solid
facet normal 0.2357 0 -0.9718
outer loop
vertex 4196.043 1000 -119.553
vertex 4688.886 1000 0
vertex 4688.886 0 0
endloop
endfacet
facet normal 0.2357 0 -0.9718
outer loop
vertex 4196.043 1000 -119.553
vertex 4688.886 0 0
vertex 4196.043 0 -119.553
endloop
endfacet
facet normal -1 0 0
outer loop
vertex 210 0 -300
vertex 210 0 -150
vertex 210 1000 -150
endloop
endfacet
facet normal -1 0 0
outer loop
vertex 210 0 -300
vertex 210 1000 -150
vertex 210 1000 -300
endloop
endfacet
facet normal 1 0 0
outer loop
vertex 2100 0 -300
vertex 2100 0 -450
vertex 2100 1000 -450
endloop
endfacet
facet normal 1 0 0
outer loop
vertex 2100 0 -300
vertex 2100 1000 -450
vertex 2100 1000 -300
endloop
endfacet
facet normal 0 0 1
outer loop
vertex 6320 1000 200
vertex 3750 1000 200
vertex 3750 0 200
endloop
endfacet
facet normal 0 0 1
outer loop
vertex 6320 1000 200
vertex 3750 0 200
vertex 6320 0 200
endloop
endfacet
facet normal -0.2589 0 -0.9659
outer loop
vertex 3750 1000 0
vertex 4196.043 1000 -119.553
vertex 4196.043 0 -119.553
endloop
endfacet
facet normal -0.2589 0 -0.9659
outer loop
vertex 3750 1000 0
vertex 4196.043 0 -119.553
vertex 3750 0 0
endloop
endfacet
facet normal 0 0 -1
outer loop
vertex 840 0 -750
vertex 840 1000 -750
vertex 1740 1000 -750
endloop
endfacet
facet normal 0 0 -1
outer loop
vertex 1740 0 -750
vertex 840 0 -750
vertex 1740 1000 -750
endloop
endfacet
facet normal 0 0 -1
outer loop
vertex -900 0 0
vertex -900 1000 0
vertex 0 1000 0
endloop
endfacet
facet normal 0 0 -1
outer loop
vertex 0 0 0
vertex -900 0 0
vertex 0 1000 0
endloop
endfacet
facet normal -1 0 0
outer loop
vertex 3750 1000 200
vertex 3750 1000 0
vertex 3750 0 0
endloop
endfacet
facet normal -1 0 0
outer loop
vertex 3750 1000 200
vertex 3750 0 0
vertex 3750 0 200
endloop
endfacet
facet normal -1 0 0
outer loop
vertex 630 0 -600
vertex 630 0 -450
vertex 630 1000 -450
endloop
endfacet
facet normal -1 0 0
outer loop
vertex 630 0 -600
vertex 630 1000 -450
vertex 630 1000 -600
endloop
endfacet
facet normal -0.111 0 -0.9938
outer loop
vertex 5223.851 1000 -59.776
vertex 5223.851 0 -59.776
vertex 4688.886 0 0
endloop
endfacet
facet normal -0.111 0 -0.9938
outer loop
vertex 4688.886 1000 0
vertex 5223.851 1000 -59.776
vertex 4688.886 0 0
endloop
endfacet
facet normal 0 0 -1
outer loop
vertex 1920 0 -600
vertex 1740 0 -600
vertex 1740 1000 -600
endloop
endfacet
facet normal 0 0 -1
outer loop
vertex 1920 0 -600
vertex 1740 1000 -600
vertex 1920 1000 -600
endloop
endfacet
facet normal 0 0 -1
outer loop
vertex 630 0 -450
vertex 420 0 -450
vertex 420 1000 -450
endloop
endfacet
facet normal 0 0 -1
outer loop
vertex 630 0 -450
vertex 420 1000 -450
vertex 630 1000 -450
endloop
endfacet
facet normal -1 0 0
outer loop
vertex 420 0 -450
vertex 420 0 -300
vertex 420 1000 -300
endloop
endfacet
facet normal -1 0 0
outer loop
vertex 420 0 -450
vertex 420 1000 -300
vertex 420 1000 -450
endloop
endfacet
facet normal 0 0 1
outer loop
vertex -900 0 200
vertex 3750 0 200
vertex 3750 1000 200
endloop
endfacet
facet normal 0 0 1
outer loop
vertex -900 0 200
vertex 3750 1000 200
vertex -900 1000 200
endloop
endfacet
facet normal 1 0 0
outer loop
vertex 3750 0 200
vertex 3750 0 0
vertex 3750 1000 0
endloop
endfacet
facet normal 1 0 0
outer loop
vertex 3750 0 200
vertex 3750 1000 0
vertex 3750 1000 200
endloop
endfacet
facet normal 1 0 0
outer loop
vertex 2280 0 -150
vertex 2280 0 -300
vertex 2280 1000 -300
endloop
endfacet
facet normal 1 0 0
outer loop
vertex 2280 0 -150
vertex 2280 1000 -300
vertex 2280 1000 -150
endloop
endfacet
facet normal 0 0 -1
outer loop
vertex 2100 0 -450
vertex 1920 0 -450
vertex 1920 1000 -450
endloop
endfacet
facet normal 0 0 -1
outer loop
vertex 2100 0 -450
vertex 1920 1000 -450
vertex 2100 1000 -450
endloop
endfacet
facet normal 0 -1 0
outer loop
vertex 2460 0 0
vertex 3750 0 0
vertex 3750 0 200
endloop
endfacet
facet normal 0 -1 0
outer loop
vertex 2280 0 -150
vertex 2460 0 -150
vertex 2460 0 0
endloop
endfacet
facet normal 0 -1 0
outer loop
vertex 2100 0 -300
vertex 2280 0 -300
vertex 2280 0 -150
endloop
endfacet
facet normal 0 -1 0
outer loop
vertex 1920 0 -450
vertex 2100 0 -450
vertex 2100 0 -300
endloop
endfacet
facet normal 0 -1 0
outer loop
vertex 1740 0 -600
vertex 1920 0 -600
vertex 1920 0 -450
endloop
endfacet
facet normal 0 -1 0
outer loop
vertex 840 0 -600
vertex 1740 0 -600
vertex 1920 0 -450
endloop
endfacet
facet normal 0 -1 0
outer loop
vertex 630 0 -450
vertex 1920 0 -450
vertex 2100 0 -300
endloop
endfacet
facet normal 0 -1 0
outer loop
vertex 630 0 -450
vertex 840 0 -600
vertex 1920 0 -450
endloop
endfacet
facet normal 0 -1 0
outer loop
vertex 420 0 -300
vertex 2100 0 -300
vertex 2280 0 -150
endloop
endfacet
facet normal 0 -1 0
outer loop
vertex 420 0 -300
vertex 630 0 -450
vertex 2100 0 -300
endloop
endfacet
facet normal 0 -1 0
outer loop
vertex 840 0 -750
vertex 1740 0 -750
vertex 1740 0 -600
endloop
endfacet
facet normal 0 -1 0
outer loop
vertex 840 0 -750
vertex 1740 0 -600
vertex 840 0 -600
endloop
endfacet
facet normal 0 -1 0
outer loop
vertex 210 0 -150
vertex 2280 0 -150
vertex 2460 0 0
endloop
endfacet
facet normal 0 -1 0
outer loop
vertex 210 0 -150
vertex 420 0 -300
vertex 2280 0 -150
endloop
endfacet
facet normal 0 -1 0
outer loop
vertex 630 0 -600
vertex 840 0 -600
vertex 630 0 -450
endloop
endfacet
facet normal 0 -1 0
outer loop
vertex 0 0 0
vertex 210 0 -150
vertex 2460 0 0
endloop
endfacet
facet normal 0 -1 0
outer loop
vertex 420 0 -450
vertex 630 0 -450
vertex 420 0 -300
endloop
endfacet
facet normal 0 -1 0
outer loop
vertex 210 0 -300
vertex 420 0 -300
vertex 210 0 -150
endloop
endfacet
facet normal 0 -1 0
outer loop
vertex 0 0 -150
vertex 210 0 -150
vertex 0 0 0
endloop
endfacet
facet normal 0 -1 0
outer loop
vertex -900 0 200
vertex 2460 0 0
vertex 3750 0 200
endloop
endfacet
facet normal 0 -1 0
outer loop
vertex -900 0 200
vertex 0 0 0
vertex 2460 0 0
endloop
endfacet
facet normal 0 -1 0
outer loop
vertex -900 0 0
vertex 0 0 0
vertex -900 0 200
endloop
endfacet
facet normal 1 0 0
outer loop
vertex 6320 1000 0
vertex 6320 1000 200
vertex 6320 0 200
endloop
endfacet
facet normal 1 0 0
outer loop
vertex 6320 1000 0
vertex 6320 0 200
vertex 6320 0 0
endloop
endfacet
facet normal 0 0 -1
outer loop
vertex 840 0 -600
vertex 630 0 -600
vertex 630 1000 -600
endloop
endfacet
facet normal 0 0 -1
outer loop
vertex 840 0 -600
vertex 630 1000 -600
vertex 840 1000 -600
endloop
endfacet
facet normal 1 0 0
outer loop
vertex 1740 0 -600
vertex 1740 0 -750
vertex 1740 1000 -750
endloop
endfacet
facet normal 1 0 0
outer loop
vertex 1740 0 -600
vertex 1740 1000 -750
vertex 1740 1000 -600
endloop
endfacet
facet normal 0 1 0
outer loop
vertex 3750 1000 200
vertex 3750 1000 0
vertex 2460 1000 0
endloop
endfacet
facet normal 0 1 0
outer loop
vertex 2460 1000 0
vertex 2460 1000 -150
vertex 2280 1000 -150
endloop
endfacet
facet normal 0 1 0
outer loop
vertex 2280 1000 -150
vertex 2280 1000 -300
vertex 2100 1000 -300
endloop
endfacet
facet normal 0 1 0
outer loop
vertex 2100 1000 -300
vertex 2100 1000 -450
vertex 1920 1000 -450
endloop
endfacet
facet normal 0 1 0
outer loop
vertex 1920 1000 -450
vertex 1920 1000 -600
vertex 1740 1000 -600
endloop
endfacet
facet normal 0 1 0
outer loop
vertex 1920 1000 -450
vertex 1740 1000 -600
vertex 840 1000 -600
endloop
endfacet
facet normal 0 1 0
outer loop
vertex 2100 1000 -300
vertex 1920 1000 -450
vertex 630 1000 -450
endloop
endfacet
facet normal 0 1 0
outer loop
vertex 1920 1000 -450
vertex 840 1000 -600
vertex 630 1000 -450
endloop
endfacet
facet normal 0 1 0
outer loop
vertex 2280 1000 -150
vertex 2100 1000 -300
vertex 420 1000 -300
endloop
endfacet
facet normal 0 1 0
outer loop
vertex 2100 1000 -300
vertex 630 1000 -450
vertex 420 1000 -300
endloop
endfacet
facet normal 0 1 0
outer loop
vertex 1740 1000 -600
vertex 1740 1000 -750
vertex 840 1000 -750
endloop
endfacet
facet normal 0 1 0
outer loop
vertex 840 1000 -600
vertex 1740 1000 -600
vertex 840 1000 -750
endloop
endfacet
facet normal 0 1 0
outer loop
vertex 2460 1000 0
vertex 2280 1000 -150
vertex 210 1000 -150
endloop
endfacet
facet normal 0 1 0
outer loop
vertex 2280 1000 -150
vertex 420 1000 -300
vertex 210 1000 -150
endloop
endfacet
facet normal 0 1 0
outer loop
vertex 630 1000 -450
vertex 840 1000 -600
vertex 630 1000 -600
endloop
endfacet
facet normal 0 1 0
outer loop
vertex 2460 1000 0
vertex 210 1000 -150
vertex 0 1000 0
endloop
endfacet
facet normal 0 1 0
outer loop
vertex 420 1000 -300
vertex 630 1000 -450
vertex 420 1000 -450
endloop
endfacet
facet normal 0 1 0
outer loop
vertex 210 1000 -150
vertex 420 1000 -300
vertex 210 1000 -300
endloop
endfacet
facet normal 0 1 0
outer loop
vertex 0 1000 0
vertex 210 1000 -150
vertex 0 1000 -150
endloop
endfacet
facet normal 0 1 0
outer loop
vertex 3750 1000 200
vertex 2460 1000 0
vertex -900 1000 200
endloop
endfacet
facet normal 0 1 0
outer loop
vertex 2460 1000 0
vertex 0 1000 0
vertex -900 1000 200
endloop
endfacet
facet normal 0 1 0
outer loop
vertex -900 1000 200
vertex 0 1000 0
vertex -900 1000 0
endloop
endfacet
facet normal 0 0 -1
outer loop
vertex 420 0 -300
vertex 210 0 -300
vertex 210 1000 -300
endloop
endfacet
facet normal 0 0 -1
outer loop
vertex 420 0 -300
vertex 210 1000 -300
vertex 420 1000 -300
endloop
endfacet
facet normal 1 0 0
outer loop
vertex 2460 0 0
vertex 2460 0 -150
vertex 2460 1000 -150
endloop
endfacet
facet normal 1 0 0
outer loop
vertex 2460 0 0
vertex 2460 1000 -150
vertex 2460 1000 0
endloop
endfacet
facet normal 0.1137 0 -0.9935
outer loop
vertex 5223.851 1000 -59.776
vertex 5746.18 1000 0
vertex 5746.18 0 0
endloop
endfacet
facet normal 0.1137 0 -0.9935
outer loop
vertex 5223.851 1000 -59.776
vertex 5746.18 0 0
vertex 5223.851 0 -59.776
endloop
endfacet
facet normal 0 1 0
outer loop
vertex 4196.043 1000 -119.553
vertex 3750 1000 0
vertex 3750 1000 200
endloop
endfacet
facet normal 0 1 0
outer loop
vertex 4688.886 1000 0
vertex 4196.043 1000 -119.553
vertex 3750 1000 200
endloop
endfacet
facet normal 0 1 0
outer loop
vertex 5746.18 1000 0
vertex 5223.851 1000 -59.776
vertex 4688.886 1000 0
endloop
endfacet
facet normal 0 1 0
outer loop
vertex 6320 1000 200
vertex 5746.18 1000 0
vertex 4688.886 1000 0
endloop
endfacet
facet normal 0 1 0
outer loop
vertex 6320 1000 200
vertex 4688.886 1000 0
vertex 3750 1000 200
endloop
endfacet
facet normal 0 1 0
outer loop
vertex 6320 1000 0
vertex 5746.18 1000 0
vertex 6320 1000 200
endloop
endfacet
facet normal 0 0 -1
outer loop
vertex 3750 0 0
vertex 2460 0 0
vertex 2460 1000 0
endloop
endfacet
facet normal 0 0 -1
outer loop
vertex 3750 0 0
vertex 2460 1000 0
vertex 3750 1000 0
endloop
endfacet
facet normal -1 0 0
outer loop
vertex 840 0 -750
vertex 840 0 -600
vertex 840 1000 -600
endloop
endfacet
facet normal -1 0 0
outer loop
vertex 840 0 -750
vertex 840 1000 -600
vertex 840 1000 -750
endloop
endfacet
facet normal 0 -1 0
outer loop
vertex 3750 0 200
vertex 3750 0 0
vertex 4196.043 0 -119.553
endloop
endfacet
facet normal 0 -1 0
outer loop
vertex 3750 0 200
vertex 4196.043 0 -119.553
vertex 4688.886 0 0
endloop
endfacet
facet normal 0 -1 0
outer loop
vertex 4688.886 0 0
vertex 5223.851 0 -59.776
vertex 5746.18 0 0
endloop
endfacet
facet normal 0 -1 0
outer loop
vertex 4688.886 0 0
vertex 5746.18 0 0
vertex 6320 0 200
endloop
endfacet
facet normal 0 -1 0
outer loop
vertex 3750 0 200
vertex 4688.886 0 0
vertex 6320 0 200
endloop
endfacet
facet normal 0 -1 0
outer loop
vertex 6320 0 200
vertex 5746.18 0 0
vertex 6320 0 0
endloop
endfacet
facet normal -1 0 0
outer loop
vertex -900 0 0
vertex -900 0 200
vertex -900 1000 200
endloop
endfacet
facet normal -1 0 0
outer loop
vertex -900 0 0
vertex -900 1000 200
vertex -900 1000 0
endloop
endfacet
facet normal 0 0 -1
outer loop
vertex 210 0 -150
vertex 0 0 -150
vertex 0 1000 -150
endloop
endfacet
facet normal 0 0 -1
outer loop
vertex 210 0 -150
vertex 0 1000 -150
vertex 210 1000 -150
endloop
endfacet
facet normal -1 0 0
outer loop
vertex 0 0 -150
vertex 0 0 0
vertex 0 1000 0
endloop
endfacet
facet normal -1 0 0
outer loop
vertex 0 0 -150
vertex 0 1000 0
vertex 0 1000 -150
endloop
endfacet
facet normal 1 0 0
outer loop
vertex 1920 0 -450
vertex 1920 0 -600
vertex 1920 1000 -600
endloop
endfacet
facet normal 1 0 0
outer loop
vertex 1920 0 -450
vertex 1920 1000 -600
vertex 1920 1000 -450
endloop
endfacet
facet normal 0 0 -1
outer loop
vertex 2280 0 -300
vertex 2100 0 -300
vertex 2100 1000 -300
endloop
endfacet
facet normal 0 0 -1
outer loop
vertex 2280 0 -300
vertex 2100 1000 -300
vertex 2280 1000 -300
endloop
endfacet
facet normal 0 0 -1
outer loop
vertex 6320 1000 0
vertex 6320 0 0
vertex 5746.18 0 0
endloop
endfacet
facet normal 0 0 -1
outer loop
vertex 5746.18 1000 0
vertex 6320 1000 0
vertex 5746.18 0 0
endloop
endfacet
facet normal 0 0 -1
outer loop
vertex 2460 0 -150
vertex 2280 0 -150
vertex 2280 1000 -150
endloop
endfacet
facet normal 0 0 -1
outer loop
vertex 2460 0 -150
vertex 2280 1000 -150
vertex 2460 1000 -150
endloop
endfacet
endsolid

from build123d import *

# Parameters (mm, degrees)
BOSS_EXTRUDE1_DEPTH = 1000
BOSS_EXTRUDE3_DEPTH = 1000


with BuildPart() as part:
    # Sketch1 → Boss-Extrude1 (new body)
    with BuildSketch(Plane(origin=(0, 0, 0), x_dir=(1, 0, 0), z_dir=(0, 1, 0))):
        Polygon((0, 0), (0, 150), (210, 150), (210, 300), (420, 300), (420, 450), (630, 450), (630, 600), (840, 600), (840, 750), (1740, 750), (1740, 600), (1920, 600), (1920, 450), (2100, 450), (2100, 300), (2280, 300), (2280, 150), (2460, 150), (2460, 0), (3750, 0), (3750, -200), (-900, -200), (-900, 0), align=None)
    extrude(amount=BOSS_EXTRUDE1_DEPTH)


with BuildPart() as body_2:
    # Sketch2 → Boss-Extrude3 (new body)
    with BuildSketch(Plane(origin=(0, 1000, 0), x_dir=(1, 0, 0), z_dir=(0, 1, 0))):
        Polygon((3750, -200), (6320, -200), (6320, 0), (5746.179767889, 0), (5223.851175632, 59.776256231), (4688.885601305, 0), (4196.043300547, 119.552512462), (3750, 0), align=None)
    extrude(amount=-BOSS_EXTRUDE3_DEPTH)


solid = Compound([part.part, body_2.part])
